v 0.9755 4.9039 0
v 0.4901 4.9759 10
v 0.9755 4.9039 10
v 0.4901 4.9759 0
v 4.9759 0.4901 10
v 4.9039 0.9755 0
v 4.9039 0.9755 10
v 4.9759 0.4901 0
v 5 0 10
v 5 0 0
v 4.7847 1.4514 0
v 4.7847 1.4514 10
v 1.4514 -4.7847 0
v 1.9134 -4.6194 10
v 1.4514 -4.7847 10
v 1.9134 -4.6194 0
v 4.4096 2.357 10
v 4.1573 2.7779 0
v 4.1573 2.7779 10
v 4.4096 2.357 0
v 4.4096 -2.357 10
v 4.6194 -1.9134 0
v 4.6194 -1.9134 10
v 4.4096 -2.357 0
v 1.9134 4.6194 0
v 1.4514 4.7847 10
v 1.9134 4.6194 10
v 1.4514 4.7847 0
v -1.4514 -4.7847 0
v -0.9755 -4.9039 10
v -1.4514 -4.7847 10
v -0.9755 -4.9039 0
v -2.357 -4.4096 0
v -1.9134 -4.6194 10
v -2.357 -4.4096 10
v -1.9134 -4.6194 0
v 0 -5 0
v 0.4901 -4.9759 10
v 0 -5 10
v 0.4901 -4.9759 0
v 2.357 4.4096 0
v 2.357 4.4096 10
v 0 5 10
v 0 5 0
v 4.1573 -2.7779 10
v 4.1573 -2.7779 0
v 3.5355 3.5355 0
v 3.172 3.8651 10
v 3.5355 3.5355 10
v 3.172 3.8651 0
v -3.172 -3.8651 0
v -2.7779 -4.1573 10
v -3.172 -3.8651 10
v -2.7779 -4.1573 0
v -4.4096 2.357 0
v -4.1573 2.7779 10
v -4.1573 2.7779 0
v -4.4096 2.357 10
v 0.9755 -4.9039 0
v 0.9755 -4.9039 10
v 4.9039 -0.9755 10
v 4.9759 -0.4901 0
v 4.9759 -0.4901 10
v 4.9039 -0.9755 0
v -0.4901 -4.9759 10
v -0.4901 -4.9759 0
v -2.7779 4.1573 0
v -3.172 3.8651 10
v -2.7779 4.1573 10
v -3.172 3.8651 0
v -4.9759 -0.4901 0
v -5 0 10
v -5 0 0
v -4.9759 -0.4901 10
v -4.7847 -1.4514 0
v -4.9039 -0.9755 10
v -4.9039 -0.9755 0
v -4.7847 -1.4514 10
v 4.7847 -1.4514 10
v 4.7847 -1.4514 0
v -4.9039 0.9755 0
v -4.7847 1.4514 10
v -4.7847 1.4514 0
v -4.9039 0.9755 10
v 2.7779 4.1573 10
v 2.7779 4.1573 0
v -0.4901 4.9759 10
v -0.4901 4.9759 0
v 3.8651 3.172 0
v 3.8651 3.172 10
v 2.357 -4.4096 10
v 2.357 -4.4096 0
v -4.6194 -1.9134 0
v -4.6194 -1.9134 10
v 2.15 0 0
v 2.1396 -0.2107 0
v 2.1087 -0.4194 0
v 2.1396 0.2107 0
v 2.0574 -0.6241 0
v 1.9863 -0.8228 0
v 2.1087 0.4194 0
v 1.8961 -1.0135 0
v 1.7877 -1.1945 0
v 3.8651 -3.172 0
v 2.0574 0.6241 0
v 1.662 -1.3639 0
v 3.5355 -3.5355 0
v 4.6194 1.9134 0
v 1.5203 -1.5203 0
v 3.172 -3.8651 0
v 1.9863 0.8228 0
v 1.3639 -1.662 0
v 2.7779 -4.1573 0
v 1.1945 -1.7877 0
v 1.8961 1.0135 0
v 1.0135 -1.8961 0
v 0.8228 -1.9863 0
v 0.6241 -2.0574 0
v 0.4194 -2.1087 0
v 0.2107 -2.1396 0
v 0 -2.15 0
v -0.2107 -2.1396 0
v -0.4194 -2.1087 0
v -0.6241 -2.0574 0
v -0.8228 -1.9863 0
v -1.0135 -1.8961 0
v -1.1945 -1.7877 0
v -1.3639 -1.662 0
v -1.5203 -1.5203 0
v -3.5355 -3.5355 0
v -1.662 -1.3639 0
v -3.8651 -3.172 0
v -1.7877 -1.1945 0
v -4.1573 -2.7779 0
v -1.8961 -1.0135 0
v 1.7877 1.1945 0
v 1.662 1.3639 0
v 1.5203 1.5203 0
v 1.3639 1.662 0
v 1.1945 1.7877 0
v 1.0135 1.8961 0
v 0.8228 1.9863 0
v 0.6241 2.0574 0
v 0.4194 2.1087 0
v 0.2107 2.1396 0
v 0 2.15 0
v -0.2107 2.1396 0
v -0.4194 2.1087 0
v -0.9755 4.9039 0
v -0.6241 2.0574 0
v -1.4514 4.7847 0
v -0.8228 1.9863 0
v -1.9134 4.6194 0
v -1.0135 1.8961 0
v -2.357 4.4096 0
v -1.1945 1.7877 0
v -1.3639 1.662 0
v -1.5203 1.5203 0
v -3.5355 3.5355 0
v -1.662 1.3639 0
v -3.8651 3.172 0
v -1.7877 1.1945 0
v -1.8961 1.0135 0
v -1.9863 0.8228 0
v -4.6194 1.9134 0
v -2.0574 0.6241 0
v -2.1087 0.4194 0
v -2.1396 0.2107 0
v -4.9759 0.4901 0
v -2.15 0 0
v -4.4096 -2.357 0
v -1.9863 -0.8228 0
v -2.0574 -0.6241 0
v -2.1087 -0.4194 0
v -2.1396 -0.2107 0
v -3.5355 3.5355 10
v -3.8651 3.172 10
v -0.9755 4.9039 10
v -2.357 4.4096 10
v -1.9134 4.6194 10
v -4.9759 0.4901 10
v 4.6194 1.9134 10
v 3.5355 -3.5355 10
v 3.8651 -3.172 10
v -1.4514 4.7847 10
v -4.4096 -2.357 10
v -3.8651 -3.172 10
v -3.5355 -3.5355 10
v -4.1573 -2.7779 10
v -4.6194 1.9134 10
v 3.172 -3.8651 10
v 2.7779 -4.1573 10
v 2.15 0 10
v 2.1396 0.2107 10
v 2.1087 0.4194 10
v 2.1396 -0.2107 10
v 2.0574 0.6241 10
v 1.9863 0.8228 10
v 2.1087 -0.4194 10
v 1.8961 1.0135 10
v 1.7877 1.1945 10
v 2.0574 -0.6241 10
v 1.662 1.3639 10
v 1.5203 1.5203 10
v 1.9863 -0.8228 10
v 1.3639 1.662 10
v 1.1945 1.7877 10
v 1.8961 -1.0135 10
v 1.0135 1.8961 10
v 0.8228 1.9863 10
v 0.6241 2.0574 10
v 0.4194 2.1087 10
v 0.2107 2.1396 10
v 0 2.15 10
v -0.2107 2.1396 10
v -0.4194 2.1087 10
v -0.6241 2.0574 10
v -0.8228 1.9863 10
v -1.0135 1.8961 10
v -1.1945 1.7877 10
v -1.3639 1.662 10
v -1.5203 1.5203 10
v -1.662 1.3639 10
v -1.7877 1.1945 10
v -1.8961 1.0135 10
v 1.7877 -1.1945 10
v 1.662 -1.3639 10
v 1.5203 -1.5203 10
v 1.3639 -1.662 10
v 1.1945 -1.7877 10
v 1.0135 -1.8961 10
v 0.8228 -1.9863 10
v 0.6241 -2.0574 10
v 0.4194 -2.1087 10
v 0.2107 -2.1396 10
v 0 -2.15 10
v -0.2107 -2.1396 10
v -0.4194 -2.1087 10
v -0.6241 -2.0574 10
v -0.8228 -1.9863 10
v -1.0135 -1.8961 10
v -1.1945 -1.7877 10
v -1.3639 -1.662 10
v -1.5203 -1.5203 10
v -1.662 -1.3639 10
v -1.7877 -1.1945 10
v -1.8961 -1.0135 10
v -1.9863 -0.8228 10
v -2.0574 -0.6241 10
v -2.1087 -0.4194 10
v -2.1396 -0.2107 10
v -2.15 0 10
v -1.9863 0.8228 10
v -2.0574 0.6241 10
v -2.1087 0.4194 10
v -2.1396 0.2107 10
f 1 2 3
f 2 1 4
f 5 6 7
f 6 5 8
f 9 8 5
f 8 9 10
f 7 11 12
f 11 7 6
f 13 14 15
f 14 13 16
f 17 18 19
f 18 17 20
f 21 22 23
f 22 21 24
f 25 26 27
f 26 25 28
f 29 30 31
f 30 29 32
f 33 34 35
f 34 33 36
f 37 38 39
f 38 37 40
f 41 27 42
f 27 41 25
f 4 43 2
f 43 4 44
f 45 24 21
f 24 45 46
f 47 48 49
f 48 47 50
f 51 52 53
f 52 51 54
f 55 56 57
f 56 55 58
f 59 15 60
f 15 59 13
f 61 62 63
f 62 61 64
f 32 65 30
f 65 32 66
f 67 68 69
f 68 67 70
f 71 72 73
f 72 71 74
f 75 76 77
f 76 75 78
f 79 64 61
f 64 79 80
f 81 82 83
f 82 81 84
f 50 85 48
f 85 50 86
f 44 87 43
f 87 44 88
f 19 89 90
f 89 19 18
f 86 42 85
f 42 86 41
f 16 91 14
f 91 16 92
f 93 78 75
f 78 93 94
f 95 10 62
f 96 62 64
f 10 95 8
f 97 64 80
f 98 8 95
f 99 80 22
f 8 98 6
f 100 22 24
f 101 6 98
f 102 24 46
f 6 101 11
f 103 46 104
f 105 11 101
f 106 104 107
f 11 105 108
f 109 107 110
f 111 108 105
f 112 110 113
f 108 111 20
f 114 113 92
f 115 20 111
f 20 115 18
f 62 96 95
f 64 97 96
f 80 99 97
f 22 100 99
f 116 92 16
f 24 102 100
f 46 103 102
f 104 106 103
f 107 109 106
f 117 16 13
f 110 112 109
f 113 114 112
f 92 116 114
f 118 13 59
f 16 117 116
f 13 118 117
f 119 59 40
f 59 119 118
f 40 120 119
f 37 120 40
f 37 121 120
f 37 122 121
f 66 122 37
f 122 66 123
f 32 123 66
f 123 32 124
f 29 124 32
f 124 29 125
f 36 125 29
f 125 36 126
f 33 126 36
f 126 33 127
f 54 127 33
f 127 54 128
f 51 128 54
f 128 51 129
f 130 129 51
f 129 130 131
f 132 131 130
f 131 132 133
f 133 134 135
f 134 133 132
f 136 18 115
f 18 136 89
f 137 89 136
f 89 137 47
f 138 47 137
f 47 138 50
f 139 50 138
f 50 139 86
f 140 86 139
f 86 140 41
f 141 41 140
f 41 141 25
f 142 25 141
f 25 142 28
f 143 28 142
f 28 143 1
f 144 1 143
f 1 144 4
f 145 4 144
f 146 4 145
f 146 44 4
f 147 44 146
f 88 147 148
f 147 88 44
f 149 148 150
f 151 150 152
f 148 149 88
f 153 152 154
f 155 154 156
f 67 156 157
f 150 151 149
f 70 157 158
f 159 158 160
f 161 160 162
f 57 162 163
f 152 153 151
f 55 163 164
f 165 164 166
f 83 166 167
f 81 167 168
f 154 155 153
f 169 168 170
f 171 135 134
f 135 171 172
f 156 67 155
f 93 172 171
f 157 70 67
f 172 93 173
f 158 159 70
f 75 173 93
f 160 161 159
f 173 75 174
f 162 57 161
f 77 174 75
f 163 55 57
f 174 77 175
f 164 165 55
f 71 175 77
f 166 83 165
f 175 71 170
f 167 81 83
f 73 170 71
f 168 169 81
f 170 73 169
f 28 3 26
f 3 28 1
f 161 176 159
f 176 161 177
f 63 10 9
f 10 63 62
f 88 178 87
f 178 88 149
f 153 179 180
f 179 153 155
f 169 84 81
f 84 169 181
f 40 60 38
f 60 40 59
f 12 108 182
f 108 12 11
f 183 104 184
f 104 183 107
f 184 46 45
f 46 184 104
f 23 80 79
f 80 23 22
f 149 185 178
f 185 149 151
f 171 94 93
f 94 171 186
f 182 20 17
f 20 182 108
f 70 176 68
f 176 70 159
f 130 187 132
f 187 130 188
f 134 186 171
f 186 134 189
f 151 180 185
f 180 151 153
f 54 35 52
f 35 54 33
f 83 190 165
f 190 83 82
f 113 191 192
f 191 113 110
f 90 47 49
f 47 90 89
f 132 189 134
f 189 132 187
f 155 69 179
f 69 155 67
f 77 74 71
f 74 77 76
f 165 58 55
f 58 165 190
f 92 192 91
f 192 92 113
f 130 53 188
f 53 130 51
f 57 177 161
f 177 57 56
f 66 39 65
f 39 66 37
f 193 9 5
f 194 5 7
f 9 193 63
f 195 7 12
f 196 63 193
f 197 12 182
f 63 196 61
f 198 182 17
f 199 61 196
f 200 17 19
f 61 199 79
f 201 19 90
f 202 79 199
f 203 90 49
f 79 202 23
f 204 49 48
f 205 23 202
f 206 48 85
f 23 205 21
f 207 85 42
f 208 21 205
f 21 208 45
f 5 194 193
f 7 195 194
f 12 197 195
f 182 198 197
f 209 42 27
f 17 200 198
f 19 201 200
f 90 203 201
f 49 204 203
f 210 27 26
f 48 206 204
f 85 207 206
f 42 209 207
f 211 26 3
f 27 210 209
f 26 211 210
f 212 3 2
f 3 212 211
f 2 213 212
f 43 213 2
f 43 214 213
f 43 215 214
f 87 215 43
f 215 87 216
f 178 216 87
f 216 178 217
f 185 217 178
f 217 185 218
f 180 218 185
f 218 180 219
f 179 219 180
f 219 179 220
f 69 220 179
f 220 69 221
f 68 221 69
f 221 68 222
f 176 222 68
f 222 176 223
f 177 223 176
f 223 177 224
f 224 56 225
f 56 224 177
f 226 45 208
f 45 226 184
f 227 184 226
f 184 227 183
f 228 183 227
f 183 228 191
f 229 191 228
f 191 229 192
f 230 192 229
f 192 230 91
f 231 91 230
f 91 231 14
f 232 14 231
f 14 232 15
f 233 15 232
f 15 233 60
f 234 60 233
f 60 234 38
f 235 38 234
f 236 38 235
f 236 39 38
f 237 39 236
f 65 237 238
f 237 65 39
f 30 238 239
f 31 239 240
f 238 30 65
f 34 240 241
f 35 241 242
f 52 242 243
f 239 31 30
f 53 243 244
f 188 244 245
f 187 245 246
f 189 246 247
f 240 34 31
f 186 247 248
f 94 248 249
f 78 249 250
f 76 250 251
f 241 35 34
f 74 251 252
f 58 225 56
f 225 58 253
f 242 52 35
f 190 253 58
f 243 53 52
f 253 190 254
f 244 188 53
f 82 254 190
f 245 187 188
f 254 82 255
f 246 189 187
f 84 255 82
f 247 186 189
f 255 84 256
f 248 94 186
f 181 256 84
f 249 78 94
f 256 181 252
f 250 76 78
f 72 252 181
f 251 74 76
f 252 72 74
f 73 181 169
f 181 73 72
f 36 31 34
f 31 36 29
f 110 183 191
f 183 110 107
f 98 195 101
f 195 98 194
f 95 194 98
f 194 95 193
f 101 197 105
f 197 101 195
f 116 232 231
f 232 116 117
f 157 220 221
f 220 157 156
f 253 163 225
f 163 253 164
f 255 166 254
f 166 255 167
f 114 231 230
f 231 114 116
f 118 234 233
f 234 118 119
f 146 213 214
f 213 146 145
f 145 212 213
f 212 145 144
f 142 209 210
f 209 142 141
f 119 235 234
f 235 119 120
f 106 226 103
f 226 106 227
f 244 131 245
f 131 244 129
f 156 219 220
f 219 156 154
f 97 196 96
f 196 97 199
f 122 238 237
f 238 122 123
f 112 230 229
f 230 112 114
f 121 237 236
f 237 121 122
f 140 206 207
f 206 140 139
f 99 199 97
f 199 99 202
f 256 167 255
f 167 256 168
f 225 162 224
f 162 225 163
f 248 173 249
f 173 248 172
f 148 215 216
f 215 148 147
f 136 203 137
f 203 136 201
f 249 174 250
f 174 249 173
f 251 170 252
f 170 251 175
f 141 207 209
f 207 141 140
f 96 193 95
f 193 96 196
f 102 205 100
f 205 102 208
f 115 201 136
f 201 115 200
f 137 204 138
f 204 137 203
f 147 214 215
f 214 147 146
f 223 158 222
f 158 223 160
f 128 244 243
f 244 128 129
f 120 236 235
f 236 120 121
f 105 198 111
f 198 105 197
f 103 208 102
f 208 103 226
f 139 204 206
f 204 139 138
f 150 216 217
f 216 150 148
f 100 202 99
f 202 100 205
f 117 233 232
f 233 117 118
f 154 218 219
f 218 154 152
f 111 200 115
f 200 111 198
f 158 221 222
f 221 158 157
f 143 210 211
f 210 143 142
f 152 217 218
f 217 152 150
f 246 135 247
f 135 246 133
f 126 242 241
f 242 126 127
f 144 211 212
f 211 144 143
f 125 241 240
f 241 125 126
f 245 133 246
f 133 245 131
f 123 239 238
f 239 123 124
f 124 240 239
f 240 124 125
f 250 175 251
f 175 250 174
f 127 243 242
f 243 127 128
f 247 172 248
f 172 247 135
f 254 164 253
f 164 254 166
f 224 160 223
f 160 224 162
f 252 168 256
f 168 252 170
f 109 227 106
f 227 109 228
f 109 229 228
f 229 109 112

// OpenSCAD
$fn=64;

difference() {
  cylinder(d=10, h=10);
  translate([0, 0, -1]) cylinder(d=4.3, h=12);
}
